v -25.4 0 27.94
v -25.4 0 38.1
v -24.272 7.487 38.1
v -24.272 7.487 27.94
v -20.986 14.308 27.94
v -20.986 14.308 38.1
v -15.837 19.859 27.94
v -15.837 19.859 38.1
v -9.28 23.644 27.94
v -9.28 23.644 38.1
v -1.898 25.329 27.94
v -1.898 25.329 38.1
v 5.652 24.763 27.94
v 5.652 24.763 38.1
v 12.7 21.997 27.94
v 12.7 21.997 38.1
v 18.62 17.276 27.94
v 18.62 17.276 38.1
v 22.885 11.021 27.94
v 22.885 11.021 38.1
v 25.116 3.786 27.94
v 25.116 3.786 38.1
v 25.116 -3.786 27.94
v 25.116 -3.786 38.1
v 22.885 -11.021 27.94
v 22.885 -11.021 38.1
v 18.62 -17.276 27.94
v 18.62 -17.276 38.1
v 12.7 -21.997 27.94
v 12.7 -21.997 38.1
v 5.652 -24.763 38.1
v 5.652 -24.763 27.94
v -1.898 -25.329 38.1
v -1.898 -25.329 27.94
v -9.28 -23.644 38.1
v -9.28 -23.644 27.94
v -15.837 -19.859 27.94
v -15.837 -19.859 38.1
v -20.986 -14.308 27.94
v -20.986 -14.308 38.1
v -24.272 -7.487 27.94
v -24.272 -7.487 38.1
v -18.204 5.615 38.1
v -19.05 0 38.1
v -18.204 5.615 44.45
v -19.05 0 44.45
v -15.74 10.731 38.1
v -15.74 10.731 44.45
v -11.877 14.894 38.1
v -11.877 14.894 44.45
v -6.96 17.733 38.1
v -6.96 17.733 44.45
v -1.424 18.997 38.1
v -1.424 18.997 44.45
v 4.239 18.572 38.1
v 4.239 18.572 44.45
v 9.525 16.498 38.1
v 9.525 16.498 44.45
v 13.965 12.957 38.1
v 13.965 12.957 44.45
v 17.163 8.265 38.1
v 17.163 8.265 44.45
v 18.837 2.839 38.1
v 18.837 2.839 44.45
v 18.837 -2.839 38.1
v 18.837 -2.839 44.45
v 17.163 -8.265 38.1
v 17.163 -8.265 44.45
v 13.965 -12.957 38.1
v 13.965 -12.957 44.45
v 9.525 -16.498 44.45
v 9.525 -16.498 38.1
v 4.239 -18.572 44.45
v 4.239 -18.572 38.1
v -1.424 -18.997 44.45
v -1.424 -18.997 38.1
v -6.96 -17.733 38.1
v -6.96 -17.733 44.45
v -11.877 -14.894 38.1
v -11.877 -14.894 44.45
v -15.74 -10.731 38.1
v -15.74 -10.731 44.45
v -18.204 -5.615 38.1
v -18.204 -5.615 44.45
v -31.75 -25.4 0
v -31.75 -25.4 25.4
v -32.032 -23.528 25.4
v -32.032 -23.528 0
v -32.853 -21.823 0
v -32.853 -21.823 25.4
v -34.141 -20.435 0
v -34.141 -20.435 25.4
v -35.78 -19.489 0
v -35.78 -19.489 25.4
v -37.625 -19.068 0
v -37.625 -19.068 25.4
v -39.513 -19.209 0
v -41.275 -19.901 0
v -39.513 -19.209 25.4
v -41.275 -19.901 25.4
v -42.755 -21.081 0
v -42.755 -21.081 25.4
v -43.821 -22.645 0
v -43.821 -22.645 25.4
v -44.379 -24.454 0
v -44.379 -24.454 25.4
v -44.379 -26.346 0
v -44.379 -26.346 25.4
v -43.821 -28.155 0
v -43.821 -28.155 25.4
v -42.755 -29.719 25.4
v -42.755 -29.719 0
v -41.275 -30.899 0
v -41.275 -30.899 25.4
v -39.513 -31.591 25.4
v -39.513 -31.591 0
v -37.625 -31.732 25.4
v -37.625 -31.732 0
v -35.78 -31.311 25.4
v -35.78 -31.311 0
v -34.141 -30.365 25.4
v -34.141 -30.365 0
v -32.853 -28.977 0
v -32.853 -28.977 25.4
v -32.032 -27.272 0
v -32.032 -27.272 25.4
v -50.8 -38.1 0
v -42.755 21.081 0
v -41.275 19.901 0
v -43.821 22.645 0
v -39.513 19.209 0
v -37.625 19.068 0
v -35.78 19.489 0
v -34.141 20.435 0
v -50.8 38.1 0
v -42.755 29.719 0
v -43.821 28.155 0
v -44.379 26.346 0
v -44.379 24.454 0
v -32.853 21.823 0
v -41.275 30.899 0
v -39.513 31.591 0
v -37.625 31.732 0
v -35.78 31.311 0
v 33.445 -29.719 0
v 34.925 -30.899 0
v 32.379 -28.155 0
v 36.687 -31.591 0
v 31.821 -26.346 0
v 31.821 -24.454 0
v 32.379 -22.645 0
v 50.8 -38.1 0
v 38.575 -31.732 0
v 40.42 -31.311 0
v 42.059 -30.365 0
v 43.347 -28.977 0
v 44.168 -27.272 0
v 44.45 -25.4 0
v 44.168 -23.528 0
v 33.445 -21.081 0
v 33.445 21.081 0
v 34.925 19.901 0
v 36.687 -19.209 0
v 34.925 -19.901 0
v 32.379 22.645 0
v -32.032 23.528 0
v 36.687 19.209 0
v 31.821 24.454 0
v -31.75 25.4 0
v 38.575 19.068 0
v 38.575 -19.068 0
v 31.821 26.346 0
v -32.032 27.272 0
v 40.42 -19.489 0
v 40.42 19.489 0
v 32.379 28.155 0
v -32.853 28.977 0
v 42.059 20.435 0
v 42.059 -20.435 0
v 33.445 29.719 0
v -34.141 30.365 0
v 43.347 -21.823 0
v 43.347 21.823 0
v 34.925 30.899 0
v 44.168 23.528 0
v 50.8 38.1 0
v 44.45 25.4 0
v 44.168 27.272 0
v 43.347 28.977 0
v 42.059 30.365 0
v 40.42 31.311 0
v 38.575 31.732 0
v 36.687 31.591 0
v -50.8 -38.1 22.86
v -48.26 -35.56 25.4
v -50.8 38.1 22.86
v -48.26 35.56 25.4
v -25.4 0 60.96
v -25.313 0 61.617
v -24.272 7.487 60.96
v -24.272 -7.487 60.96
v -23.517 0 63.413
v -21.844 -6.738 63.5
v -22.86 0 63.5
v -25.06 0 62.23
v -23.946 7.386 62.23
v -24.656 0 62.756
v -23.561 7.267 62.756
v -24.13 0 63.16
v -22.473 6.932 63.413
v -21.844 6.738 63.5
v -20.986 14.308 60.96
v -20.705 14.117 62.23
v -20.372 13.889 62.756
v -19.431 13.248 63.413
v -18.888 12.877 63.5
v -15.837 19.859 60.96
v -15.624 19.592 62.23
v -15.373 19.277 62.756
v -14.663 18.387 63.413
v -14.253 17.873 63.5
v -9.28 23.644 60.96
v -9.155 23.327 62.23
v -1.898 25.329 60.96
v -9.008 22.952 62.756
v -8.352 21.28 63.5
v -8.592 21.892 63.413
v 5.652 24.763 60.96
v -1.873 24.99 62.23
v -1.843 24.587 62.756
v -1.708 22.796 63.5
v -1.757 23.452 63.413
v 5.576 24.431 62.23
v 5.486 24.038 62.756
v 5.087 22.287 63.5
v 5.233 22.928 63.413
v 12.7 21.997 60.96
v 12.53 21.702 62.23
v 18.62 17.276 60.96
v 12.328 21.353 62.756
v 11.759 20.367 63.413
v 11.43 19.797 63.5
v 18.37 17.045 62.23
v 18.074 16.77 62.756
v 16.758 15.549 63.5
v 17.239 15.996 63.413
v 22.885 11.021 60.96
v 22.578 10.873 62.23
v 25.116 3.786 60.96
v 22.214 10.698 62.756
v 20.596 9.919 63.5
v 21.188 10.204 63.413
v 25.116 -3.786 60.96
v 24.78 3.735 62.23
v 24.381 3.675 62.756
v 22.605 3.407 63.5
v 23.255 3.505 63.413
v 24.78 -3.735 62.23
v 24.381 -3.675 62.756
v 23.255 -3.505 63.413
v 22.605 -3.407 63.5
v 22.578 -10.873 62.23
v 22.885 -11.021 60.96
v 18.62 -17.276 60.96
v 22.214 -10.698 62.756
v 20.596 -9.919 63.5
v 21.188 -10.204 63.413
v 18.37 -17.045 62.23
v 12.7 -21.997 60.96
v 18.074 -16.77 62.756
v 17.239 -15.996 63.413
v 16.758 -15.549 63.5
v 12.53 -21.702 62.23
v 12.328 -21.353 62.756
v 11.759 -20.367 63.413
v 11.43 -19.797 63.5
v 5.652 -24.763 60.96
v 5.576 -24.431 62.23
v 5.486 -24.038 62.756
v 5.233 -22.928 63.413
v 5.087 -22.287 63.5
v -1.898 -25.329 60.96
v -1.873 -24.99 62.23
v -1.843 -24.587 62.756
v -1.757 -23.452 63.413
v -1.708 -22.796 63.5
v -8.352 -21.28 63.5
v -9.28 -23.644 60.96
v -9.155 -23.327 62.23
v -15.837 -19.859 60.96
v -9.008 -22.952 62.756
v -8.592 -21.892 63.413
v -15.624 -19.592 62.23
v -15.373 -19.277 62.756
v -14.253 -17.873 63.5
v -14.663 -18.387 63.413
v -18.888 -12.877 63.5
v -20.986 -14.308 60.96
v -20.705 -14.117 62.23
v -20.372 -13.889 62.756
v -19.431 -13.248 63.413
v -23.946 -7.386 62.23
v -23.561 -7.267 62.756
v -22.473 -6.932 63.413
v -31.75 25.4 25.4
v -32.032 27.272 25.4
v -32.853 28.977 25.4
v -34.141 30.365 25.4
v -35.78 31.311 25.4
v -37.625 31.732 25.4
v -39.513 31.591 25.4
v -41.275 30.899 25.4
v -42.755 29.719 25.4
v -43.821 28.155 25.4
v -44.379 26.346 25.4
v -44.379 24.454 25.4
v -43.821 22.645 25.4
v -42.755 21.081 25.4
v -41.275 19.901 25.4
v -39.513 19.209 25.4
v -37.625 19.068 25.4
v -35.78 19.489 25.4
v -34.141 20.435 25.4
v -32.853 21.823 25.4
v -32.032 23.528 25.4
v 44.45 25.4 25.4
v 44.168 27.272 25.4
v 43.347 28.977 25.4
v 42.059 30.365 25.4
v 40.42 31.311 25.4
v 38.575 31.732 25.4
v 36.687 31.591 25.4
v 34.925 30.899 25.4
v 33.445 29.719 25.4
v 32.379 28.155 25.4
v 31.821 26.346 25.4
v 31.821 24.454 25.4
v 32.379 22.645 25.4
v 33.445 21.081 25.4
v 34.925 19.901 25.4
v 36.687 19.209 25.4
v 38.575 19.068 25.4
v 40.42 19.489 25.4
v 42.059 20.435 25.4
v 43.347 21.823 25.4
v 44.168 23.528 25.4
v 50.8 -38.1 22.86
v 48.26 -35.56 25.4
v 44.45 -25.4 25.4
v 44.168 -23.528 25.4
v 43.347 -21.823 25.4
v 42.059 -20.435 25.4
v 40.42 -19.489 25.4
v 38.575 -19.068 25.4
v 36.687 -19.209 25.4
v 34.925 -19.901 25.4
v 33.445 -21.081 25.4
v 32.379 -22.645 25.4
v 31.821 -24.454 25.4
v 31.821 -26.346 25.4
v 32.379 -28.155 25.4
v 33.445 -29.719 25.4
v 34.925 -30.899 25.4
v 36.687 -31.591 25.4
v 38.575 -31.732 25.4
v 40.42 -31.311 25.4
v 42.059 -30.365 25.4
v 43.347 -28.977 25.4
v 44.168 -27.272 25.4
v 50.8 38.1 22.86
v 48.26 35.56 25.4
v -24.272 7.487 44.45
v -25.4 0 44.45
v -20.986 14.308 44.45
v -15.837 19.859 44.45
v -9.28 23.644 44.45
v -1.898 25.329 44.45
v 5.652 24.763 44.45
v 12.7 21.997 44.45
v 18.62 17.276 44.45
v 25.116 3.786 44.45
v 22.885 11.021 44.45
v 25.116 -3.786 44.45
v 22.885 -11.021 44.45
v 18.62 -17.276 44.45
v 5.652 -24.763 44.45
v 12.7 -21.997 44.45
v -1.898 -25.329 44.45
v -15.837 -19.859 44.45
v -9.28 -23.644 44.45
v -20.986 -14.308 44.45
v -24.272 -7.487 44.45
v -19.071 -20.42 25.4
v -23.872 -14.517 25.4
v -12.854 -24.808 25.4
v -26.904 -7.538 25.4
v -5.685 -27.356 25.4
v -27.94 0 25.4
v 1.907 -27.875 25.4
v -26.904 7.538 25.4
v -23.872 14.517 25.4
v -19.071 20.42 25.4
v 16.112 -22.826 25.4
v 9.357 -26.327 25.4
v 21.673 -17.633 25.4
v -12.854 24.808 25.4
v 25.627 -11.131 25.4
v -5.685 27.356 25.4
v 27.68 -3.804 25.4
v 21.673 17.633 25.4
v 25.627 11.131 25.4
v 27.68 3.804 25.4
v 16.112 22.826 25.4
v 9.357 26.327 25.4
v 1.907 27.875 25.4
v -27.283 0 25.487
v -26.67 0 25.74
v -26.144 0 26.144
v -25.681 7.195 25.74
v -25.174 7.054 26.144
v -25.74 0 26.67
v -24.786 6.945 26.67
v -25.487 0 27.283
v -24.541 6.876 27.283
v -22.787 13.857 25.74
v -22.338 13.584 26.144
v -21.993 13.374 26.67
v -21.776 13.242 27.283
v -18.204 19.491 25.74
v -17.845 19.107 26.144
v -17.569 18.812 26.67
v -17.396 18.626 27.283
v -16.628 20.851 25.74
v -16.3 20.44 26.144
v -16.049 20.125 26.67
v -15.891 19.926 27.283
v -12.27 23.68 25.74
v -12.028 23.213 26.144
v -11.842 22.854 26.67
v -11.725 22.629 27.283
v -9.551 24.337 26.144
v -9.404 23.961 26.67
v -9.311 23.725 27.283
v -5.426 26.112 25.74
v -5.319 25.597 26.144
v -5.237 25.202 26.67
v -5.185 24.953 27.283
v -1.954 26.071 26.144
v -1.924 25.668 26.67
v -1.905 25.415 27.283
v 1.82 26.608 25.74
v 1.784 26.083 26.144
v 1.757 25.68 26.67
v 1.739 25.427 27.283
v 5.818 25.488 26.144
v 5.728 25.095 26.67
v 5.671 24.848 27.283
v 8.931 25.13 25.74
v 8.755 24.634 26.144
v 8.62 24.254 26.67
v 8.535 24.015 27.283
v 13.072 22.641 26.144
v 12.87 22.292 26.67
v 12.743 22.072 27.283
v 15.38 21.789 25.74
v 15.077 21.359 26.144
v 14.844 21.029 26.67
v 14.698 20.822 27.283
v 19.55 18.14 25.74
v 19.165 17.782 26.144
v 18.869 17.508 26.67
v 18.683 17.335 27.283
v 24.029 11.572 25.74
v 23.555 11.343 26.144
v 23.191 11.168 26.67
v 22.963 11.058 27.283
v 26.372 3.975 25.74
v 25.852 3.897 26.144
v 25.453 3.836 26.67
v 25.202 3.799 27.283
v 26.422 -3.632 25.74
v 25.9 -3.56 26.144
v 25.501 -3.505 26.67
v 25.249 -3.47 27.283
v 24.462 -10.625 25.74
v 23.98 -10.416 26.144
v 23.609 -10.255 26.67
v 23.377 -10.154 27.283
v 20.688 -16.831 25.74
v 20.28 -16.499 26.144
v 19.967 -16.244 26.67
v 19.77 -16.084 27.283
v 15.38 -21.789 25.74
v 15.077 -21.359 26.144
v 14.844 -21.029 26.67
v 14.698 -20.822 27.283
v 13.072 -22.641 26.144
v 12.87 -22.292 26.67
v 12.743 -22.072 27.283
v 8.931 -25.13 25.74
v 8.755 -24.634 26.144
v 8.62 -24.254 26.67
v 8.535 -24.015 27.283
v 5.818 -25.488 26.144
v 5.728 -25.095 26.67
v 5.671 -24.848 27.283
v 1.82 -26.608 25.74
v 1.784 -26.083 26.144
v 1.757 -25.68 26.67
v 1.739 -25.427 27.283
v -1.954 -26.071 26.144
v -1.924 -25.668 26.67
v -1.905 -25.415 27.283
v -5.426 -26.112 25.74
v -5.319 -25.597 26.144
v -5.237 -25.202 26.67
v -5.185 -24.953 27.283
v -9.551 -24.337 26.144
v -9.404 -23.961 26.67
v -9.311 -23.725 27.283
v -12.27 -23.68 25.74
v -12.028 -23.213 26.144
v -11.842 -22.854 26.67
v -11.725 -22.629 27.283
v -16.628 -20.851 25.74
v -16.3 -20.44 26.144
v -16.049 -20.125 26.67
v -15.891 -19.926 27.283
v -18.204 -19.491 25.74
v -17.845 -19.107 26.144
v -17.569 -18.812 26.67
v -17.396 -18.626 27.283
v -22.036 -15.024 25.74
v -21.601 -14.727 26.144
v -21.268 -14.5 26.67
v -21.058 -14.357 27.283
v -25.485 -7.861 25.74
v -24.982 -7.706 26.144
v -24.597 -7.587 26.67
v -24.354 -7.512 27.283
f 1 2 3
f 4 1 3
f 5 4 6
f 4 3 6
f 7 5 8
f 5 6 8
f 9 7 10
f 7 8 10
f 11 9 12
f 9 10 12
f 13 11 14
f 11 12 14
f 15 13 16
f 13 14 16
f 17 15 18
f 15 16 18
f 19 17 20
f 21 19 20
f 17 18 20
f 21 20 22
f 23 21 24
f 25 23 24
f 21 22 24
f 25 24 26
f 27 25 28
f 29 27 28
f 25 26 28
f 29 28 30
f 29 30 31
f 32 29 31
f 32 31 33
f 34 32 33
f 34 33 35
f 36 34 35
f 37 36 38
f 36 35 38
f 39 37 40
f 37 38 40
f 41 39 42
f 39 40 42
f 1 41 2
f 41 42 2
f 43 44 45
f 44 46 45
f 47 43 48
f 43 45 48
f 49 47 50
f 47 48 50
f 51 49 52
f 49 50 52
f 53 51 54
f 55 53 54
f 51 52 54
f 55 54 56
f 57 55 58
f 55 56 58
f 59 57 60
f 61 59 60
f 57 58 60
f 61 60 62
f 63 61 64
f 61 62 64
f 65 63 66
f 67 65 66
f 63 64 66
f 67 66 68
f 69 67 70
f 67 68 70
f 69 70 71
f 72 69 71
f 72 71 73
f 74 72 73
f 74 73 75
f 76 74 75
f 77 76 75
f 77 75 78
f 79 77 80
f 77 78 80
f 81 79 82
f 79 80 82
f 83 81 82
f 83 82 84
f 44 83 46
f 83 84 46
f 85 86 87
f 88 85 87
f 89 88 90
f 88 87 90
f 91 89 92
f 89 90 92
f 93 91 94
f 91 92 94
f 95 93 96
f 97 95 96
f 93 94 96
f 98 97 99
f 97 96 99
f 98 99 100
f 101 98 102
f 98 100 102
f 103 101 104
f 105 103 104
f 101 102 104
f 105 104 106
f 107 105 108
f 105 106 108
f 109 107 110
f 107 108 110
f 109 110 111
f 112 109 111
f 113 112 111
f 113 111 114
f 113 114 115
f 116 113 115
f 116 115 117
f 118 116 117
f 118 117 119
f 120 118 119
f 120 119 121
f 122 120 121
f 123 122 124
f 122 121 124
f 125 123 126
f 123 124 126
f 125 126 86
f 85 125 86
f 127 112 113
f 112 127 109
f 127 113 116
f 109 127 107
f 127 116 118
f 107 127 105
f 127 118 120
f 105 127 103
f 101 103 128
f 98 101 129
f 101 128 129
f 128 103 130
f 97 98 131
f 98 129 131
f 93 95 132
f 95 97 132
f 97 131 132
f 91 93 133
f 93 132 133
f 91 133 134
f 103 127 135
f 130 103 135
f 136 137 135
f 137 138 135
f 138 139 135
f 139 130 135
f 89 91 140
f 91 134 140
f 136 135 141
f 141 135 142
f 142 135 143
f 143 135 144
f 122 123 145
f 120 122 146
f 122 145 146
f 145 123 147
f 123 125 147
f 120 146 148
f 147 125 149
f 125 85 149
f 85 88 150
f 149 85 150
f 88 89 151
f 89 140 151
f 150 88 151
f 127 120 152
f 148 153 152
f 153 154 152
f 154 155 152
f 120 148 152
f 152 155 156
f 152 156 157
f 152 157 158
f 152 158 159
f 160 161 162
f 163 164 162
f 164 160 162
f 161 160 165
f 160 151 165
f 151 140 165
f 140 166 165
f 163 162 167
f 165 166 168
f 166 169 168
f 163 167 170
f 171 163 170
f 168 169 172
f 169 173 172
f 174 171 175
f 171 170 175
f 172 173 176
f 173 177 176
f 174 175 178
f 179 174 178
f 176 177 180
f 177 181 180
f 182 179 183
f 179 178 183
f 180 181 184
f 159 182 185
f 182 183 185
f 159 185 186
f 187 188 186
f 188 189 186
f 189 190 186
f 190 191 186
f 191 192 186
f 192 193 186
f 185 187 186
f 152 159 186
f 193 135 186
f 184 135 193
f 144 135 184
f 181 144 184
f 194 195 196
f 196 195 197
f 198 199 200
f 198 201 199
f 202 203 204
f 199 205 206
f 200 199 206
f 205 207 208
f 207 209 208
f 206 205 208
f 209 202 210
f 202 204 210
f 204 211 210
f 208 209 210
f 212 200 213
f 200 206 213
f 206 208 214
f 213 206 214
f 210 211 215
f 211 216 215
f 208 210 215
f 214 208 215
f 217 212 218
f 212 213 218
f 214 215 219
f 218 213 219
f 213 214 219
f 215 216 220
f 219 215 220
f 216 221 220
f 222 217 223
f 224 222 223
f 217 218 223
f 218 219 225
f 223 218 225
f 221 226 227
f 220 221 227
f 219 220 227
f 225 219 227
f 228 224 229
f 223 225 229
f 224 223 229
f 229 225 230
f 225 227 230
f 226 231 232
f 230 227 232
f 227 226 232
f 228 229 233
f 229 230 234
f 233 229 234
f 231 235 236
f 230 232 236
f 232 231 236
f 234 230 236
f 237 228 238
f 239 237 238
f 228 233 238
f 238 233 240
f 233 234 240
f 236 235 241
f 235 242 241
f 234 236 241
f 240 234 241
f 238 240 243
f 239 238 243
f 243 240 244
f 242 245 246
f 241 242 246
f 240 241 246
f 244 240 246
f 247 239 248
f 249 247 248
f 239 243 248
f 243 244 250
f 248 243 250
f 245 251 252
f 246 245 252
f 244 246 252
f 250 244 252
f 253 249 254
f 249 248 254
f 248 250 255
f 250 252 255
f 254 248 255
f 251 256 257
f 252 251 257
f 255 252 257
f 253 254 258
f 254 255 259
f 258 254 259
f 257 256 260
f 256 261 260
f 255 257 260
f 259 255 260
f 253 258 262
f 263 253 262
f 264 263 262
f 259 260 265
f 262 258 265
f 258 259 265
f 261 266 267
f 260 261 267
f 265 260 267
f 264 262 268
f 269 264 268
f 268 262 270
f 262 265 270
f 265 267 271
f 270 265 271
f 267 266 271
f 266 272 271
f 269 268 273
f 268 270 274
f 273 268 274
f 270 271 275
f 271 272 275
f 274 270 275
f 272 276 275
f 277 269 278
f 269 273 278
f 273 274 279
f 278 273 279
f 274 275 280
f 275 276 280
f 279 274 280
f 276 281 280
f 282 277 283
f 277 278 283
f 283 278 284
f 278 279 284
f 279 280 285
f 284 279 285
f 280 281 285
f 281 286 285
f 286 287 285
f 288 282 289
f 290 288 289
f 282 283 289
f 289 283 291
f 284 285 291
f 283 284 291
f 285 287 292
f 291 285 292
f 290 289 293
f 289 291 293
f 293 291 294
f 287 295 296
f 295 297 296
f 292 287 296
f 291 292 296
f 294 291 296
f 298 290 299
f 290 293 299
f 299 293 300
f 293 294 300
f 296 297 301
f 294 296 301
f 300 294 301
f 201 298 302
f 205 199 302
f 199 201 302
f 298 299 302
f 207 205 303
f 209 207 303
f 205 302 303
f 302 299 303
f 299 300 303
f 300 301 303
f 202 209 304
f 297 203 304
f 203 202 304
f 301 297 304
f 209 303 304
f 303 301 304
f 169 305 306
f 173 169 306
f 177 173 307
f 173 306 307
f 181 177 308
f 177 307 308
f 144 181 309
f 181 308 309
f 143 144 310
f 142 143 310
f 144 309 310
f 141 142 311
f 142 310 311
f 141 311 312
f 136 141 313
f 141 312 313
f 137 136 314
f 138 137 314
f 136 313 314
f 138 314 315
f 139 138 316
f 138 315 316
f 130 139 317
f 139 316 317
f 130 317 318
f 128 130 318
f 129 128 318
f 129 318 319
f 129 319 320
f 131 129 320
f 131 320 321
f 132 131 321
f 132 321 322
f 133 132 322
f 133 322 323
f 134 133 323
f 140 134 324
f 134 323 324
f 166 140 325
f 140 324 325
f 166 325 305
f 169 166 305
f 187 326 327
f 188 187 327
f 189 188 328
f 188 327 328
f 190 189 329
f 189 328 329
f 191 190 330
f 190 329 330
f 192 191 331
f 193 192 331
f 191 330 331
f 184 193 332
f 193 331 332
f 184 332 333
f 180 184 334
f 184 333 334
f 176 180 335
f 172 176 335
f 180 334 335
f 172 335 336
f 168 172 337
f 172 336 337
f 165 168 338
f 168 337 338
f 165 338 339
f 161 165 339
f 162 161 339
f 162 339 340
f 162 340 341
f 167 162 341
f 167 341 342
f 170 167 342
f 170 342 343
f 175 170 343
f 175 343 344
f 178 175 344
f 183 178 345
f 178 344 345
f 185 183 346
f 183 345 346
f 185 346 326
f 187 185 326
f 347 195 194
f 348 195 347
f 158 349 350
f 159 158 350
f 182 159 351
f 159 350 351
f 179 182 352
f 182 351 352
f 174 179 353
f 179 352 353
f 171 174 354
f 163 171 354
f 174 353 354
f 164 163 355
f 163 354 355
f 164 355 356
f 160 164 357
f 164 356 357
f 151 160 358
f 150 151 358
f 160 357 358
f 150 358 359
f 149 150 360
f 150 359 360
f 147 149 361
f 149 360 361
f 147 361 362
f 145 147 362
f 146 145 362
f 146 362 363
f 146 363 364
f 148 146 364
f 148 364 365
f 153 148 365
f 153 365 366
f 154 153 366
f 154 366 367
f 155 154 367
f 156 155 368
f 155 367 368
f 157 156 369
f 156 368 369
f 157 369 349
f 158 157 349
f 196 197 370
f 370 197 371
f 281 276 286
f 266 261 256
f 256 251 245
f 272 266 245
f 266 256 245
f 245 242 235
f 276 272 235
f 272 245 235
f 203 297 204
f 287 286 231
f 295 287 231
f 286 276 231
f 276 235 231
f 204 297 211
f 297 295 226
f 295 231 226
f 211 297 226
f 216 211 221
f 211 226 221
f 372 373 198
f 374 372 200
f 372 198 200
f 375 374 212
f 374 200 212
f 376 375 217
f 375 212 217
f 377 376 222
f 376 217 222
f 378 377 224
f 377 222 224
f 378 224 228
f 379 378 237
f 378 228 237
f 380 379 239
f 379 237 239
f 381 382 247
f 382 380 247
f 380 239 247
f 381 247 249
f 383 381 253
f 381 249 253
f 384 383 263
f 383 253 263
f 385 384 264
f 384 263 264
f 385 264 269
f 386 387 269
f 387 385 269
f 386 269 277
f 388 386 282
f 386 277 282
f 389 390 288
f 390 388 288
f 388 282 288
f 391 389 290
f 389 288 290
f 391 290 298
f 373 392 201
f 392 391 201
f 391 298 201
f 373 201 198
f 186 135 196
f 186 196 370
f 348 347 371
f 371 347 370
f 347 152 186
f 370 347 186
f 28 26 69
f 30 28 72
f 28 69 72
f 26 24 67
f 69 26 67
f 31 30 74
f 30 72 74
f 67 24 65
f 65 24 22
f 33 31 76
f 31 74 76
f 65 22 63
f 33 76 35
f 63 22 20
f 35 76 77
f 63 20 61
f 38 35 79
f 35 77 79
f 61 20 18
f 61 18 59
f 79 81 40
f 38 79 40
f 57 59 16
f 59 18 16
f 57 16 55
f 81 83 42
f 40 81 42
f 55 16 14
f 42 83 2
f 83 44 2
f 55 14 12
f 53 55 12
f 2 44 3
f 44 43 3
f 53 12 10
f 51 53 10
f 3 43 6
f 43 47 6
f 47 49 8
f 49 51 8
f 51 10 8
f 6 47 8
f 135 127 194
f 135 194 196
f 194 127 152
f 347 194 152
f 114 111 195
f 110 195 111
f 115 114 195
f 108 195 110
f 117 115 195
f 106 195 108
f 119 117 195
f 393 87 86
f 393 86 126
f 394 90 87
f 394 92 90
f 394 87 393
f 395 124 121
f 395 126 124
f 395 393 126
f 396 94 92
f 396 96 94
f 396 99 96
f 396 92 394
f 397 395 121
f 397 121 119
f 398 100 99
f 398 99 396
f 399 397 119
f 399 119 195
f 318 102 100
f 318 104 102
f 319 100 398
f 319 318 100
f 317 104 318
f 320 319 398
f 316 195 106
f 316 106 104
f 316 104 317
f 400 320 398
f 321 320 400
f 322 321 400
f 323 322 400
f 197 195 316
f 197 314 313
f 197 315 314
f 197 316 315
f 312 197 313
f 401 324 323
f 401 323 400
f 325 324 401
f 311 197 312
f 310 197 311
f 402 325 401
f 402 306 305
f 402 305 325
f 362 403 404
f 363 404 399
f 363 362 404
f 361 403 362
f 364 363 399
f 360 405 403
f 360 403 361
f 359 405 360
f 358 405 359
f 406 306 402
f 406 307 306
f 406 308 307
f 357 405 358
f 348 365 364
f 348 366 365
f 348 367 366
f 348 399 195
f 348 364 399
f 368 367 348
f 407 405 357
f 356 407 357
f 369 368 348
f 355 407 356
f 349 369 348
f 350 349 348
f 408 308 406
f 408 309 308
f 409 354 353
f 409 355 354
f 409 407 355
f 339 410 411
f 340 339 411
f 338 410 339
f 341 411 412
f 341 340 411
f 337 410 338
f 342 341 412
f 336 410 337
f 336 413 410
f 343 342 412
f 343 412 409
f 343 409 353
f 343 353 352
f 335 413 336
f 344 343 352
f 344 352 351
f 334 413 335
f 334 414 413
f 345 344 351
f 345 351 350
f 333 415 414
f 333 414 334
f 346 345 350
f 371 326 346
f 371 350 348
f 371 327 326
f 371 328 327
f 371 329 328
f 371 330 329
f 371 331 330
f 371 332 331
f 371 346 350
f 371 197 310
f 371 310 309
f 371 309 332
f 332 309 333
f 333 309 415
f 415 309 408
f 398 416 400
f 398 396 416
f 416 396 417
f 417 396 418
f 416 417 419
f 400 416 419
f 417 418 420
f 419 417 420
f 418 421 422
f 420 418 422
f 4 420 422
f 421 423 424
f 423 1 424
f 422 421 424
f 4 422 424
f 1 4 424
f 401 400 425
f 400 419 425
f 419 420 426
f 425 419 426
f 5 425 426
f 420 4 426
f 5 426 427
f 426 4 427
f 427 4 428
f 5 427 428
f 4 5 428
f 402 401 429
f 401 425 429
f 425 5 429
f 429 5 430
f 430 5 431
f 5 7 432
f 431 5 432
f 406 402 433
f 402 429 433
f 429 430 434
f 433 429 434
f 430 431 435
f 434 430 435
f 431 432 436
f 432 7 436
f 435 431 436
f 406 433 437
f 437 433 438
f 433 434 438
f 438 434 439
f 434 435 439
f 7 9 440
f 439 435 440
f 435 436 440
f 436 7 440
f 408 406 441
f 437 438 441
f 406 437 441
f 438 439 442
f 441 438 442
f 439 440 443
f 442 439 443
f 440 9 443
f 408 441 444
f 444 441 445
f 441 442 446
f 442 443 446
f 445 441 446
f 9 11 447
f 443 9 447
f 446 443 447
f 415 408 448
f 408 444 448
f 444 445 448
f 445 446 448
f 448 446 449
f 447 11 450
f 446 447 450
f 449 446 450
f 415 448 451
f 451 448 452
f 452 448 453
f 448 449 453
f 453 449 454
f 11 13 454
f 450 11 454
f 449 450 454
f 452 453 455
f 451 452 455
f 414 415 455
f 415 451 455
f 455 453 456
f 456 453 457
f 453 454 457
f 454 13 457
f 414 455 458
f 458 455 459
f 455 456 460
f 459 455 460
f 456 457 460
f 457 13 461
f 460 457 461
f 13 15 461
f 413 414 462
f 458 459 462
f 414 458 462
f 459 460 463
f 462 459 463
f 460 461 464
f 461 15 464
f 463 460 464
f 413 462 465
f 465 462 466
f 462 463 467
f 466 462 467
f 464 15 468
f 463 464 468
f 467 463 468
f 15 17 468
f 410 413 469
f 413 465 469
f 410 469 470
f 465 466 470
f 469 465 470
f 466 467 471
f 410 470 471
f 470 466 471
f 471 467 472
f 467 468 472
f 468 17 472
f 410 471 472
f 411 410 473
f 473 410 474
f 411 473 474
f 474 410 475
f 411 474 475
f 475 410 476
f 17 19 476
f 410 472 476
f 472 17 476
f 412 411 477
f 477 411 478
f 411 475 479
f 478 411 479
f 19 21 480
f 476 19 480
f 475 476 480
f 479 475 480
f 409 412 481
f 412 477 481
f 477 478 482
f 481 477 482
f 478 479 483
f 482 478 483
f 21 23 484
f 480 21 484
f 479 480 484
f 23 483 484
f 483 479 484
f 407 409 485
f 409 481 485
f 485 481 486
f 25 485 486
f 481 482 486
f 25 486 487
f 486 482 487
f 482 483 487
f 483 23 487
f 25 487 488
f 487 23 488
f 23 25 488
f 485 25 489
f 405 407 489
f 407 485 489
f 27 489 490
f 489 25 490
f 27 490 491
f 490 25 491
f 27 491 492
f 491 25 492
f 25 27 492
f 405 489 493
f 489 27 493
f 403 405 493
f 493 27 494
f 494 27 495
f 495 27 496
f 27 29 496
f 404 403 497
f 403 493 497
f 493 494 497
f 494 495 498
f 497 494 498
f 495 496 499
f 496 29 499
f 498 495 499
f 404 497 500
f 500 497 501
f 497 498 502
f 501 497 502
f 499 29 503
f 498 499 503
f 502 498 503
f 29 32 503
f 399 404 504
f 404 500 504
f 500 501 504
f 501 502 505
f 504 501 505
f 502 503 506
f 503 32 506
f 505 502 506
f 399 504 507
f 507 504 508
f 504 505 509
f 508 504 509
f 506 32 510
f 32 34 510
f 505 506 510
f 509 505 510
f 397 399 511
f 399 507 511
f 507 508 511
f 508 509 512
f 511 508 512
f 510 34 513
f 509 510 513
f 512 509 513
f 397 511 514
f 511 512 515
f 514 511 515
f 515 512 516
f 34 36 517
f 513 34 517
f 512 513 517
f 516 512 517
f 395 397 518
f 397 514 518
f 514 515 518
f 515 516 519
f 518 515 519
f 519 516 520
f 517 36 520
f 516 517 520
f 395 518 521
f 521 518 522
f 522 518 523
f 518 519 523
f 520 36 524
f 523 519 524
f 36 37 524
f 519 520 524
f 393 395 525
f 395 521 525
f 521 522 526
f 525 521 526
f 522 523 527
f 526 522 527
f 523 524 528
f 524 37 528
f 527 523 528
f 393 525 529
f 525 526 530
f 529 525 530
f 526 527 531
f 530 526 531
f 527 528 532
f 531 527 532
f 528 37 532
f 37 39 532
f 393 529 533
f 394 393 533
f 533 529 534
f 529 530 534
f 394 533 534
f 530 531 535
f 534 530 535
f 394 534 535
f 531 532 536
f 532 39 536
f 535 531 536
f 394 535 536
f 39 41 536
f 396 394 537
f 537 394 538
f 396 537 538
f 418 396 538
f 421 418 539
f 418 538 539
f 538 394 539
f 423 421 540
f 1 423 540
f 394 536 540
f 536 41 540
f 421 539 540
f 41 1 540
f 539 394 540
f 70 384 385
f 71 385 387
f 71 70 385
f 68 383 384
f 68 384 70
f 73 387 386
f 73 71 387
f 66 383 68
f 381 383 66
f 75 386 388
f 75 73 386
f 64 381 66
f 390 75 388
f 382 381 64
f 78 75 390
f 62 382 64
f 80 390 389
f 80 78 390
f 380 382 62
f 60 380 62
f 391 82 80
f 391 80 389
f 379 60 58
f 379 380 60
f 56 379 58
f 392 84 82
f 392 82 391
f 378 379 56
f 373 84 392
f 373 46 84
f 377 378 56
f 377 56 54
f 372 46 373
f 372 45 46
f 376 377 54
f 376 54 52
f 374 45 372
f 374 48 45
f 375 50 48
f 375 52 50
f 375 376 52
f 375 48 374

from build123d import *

# Parameters (mm, degrees)
F0_W     = 101.6
F0_H     = 76.2
F1_DEPTH = 25.4
F2_R     = 6.35
F3_DEPTH = 25.4
F4_W     = 25.4
F4_H     = 38.1
F6_W     = 23.010891
F6_H     = 6.35
F8_SIZE  = 2.54
F9_R     = 2.54


with BuildPart() as f1:
    # F0 (on Top) → F1 (new body)
    with BuildSketch(Plane.XY):
        Rectangle(F0_W, F0_H)
    extrude(amount=F1_DEPTH)

    # F2 (on face) → F3 (cut)
    with BuildSketch(Plane.XY.offset(25.4)):
        with Locations((-38.1, 25.4)):
            Circle(F2_R)
        with Locations((38.1, 25.4)):
            Circle(F2_R)
        with Locations((38.1, -25.4)):
            Circle(F2_R)
        with Locations((-38.1, -25.4)):
            Circle(F2_R)
    extrude(amount=-F3_DEPTH, mode=Mode.SUBTRACT)

    # F4 (on Front) → F5 (revolve)
    with BuildSketch(Plane.XZ):
        with Locations((-12.7, 44.45)):
            Rectangle(F4_W, F4_H)
    revolve(axis=Axis((0, 0, 44.45), (0, 0, -1)))

    # F6 (on Front) → F7 (revolve, cut)
    with BuildSketch(Plane.XZ):
        with Locations((-30.555445, 41.275)):
            Rectangle(F6_W, F6_H)
    revolve(axis=Axis((0, 0, 63.5), (0, 0, -1)), mode=Mode.SUBTRACT)

    # F8
    f8_edges = [f1.edges().sort_by_distance(p)[0] for p in [
        (0, -38.1, 25.4),
        (50.8, 0, 25.4),
        (-50.8, 0, 25.4),
        (0, 38.1, 25.4),
    ]]
    chamfer(f8_edges, length=F8_SIZE)

    # F9
    f9_edges = [f1.edges().sort_by_distance(p)[0] for p in [
        (25.4, 0, 63.5),
        (25.4, 0, 25.4),
    ]]
    fillet(f9_edges, radius=F9_R)


solid = f1.part
